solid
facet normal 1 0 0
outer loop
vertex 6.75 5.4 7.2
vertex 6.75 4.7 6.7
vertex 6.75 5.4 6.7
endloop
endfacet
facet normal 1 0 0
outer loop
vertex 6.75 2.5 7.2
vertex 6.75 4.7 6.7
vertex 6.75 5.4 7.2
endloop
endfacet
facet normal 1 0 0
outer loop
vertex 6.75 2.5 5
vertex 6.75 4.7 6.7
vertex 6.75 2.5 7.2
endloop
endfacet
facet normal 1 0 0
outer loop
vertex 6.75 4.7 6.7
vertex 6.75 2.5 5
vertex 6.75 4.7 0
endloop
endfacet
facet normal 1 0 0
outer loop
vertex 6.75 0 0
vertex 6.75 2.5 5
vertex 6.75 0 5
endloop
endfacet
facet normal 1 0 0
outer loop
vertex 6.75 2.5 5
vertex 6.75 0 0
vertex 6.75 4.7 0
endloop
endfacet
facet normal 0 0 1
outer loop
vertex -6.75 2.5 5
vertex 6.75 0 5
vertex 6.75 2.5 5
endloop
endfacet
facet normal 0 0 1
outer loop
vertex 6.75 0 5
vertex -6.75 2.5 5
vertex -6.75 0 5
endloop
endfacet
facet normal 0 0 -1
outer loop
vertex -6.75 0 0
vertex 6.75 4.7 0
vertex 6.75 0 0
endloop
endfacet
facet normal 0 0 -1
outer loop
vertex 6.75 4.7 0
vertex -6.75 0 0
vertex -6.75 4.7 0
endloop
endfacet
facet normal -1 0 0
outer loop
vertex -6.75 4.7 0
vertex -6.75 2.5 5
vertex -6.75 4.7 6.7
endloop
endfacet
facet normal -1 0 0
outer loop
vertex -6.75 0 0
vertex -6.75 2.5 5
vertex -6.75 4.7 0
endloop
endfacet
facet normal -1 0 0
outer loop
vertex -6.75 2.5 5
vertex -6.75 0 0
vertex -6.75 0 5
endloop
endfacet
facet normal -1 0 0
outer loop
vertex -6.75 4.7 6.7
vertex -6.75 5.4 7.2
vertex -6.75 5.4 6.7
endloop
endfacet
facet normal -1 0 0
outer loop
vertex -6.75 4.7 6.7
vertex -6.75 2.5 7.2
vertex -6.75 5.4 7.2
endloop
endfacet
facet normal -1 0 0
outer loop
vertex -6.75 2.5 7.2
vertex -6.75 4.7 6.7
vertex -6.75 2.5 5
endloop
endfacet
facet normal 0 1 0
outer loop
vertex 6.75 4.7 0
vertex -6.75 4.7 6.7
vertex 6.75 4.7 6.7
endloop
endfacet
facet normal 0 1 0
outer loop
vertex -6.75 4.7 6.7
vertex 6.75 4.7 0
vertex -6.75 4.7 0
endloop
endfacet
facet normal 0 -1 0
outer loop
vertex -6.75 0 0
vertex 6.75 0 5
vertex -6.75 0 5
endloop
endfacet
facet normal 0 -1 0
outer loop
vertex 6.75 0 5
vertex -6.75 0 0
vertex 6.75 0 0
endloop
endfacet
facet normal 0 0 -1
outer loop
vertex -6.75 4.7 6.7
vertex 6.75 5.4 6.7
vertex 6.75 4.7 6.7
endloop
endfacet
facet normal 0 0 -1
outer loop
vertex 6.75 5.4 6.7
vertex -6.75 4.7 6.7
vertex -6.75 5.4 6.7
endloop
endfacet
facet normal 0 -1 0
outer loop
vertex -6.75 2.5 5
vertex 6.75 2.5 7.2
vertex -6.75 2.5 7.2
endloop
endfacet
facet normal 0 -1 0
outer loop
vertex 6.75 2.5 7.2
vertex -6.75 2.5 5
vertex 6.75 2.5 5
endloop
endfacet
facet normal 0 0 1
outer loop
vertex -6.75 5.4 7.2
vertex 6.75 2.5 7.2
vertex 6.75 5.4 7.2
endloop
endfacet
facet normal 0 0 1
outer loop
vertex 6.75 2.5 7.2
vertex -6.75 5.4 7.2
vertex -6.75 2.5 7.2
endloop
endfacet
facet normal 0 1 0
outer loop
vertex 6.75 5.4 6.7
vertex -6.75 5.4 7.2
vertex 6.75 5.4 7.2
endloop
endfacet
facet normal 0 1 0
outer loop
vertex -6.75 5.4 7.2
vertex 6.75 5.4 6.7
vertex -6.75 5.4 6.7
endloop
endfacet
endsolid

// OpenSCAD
$fn = 100;

fudge = 0.05;
fudge2 = 2 * fudge;
fudgez = [0, 0, -fudge];

tol = 0.3;
inch = 25.4;

pcb_t = 1.5;

//dim1 = [17, 8.5-pcb_t, 1];
dim2 = [13.5, 6.2-pcb_t, 5];
dim3 = [13.5, 6.2-4, 6.7];
pos3 = [0, dim2.y-dim3.y, 0];

//centered_cube(dim1, center="x");
centered_cube(dim2, center="x");
translate(pos3) centered_cube(dim3, center="x");
translate(pos3+[0, 0, dim3.z]) centered_cube([dim3.x, dim3.y+0.7, 0.5], center="x");

module centered_cube(dim, center="") {
    x = search("x", center) ? 0 : dim.x/2;
    y = search("y", center) ? 0 : dim.y/2;
    z = search("z", center) ? 0 : dim.z/2;
    translate([x, y, z])
        cube(dim, true);
}
